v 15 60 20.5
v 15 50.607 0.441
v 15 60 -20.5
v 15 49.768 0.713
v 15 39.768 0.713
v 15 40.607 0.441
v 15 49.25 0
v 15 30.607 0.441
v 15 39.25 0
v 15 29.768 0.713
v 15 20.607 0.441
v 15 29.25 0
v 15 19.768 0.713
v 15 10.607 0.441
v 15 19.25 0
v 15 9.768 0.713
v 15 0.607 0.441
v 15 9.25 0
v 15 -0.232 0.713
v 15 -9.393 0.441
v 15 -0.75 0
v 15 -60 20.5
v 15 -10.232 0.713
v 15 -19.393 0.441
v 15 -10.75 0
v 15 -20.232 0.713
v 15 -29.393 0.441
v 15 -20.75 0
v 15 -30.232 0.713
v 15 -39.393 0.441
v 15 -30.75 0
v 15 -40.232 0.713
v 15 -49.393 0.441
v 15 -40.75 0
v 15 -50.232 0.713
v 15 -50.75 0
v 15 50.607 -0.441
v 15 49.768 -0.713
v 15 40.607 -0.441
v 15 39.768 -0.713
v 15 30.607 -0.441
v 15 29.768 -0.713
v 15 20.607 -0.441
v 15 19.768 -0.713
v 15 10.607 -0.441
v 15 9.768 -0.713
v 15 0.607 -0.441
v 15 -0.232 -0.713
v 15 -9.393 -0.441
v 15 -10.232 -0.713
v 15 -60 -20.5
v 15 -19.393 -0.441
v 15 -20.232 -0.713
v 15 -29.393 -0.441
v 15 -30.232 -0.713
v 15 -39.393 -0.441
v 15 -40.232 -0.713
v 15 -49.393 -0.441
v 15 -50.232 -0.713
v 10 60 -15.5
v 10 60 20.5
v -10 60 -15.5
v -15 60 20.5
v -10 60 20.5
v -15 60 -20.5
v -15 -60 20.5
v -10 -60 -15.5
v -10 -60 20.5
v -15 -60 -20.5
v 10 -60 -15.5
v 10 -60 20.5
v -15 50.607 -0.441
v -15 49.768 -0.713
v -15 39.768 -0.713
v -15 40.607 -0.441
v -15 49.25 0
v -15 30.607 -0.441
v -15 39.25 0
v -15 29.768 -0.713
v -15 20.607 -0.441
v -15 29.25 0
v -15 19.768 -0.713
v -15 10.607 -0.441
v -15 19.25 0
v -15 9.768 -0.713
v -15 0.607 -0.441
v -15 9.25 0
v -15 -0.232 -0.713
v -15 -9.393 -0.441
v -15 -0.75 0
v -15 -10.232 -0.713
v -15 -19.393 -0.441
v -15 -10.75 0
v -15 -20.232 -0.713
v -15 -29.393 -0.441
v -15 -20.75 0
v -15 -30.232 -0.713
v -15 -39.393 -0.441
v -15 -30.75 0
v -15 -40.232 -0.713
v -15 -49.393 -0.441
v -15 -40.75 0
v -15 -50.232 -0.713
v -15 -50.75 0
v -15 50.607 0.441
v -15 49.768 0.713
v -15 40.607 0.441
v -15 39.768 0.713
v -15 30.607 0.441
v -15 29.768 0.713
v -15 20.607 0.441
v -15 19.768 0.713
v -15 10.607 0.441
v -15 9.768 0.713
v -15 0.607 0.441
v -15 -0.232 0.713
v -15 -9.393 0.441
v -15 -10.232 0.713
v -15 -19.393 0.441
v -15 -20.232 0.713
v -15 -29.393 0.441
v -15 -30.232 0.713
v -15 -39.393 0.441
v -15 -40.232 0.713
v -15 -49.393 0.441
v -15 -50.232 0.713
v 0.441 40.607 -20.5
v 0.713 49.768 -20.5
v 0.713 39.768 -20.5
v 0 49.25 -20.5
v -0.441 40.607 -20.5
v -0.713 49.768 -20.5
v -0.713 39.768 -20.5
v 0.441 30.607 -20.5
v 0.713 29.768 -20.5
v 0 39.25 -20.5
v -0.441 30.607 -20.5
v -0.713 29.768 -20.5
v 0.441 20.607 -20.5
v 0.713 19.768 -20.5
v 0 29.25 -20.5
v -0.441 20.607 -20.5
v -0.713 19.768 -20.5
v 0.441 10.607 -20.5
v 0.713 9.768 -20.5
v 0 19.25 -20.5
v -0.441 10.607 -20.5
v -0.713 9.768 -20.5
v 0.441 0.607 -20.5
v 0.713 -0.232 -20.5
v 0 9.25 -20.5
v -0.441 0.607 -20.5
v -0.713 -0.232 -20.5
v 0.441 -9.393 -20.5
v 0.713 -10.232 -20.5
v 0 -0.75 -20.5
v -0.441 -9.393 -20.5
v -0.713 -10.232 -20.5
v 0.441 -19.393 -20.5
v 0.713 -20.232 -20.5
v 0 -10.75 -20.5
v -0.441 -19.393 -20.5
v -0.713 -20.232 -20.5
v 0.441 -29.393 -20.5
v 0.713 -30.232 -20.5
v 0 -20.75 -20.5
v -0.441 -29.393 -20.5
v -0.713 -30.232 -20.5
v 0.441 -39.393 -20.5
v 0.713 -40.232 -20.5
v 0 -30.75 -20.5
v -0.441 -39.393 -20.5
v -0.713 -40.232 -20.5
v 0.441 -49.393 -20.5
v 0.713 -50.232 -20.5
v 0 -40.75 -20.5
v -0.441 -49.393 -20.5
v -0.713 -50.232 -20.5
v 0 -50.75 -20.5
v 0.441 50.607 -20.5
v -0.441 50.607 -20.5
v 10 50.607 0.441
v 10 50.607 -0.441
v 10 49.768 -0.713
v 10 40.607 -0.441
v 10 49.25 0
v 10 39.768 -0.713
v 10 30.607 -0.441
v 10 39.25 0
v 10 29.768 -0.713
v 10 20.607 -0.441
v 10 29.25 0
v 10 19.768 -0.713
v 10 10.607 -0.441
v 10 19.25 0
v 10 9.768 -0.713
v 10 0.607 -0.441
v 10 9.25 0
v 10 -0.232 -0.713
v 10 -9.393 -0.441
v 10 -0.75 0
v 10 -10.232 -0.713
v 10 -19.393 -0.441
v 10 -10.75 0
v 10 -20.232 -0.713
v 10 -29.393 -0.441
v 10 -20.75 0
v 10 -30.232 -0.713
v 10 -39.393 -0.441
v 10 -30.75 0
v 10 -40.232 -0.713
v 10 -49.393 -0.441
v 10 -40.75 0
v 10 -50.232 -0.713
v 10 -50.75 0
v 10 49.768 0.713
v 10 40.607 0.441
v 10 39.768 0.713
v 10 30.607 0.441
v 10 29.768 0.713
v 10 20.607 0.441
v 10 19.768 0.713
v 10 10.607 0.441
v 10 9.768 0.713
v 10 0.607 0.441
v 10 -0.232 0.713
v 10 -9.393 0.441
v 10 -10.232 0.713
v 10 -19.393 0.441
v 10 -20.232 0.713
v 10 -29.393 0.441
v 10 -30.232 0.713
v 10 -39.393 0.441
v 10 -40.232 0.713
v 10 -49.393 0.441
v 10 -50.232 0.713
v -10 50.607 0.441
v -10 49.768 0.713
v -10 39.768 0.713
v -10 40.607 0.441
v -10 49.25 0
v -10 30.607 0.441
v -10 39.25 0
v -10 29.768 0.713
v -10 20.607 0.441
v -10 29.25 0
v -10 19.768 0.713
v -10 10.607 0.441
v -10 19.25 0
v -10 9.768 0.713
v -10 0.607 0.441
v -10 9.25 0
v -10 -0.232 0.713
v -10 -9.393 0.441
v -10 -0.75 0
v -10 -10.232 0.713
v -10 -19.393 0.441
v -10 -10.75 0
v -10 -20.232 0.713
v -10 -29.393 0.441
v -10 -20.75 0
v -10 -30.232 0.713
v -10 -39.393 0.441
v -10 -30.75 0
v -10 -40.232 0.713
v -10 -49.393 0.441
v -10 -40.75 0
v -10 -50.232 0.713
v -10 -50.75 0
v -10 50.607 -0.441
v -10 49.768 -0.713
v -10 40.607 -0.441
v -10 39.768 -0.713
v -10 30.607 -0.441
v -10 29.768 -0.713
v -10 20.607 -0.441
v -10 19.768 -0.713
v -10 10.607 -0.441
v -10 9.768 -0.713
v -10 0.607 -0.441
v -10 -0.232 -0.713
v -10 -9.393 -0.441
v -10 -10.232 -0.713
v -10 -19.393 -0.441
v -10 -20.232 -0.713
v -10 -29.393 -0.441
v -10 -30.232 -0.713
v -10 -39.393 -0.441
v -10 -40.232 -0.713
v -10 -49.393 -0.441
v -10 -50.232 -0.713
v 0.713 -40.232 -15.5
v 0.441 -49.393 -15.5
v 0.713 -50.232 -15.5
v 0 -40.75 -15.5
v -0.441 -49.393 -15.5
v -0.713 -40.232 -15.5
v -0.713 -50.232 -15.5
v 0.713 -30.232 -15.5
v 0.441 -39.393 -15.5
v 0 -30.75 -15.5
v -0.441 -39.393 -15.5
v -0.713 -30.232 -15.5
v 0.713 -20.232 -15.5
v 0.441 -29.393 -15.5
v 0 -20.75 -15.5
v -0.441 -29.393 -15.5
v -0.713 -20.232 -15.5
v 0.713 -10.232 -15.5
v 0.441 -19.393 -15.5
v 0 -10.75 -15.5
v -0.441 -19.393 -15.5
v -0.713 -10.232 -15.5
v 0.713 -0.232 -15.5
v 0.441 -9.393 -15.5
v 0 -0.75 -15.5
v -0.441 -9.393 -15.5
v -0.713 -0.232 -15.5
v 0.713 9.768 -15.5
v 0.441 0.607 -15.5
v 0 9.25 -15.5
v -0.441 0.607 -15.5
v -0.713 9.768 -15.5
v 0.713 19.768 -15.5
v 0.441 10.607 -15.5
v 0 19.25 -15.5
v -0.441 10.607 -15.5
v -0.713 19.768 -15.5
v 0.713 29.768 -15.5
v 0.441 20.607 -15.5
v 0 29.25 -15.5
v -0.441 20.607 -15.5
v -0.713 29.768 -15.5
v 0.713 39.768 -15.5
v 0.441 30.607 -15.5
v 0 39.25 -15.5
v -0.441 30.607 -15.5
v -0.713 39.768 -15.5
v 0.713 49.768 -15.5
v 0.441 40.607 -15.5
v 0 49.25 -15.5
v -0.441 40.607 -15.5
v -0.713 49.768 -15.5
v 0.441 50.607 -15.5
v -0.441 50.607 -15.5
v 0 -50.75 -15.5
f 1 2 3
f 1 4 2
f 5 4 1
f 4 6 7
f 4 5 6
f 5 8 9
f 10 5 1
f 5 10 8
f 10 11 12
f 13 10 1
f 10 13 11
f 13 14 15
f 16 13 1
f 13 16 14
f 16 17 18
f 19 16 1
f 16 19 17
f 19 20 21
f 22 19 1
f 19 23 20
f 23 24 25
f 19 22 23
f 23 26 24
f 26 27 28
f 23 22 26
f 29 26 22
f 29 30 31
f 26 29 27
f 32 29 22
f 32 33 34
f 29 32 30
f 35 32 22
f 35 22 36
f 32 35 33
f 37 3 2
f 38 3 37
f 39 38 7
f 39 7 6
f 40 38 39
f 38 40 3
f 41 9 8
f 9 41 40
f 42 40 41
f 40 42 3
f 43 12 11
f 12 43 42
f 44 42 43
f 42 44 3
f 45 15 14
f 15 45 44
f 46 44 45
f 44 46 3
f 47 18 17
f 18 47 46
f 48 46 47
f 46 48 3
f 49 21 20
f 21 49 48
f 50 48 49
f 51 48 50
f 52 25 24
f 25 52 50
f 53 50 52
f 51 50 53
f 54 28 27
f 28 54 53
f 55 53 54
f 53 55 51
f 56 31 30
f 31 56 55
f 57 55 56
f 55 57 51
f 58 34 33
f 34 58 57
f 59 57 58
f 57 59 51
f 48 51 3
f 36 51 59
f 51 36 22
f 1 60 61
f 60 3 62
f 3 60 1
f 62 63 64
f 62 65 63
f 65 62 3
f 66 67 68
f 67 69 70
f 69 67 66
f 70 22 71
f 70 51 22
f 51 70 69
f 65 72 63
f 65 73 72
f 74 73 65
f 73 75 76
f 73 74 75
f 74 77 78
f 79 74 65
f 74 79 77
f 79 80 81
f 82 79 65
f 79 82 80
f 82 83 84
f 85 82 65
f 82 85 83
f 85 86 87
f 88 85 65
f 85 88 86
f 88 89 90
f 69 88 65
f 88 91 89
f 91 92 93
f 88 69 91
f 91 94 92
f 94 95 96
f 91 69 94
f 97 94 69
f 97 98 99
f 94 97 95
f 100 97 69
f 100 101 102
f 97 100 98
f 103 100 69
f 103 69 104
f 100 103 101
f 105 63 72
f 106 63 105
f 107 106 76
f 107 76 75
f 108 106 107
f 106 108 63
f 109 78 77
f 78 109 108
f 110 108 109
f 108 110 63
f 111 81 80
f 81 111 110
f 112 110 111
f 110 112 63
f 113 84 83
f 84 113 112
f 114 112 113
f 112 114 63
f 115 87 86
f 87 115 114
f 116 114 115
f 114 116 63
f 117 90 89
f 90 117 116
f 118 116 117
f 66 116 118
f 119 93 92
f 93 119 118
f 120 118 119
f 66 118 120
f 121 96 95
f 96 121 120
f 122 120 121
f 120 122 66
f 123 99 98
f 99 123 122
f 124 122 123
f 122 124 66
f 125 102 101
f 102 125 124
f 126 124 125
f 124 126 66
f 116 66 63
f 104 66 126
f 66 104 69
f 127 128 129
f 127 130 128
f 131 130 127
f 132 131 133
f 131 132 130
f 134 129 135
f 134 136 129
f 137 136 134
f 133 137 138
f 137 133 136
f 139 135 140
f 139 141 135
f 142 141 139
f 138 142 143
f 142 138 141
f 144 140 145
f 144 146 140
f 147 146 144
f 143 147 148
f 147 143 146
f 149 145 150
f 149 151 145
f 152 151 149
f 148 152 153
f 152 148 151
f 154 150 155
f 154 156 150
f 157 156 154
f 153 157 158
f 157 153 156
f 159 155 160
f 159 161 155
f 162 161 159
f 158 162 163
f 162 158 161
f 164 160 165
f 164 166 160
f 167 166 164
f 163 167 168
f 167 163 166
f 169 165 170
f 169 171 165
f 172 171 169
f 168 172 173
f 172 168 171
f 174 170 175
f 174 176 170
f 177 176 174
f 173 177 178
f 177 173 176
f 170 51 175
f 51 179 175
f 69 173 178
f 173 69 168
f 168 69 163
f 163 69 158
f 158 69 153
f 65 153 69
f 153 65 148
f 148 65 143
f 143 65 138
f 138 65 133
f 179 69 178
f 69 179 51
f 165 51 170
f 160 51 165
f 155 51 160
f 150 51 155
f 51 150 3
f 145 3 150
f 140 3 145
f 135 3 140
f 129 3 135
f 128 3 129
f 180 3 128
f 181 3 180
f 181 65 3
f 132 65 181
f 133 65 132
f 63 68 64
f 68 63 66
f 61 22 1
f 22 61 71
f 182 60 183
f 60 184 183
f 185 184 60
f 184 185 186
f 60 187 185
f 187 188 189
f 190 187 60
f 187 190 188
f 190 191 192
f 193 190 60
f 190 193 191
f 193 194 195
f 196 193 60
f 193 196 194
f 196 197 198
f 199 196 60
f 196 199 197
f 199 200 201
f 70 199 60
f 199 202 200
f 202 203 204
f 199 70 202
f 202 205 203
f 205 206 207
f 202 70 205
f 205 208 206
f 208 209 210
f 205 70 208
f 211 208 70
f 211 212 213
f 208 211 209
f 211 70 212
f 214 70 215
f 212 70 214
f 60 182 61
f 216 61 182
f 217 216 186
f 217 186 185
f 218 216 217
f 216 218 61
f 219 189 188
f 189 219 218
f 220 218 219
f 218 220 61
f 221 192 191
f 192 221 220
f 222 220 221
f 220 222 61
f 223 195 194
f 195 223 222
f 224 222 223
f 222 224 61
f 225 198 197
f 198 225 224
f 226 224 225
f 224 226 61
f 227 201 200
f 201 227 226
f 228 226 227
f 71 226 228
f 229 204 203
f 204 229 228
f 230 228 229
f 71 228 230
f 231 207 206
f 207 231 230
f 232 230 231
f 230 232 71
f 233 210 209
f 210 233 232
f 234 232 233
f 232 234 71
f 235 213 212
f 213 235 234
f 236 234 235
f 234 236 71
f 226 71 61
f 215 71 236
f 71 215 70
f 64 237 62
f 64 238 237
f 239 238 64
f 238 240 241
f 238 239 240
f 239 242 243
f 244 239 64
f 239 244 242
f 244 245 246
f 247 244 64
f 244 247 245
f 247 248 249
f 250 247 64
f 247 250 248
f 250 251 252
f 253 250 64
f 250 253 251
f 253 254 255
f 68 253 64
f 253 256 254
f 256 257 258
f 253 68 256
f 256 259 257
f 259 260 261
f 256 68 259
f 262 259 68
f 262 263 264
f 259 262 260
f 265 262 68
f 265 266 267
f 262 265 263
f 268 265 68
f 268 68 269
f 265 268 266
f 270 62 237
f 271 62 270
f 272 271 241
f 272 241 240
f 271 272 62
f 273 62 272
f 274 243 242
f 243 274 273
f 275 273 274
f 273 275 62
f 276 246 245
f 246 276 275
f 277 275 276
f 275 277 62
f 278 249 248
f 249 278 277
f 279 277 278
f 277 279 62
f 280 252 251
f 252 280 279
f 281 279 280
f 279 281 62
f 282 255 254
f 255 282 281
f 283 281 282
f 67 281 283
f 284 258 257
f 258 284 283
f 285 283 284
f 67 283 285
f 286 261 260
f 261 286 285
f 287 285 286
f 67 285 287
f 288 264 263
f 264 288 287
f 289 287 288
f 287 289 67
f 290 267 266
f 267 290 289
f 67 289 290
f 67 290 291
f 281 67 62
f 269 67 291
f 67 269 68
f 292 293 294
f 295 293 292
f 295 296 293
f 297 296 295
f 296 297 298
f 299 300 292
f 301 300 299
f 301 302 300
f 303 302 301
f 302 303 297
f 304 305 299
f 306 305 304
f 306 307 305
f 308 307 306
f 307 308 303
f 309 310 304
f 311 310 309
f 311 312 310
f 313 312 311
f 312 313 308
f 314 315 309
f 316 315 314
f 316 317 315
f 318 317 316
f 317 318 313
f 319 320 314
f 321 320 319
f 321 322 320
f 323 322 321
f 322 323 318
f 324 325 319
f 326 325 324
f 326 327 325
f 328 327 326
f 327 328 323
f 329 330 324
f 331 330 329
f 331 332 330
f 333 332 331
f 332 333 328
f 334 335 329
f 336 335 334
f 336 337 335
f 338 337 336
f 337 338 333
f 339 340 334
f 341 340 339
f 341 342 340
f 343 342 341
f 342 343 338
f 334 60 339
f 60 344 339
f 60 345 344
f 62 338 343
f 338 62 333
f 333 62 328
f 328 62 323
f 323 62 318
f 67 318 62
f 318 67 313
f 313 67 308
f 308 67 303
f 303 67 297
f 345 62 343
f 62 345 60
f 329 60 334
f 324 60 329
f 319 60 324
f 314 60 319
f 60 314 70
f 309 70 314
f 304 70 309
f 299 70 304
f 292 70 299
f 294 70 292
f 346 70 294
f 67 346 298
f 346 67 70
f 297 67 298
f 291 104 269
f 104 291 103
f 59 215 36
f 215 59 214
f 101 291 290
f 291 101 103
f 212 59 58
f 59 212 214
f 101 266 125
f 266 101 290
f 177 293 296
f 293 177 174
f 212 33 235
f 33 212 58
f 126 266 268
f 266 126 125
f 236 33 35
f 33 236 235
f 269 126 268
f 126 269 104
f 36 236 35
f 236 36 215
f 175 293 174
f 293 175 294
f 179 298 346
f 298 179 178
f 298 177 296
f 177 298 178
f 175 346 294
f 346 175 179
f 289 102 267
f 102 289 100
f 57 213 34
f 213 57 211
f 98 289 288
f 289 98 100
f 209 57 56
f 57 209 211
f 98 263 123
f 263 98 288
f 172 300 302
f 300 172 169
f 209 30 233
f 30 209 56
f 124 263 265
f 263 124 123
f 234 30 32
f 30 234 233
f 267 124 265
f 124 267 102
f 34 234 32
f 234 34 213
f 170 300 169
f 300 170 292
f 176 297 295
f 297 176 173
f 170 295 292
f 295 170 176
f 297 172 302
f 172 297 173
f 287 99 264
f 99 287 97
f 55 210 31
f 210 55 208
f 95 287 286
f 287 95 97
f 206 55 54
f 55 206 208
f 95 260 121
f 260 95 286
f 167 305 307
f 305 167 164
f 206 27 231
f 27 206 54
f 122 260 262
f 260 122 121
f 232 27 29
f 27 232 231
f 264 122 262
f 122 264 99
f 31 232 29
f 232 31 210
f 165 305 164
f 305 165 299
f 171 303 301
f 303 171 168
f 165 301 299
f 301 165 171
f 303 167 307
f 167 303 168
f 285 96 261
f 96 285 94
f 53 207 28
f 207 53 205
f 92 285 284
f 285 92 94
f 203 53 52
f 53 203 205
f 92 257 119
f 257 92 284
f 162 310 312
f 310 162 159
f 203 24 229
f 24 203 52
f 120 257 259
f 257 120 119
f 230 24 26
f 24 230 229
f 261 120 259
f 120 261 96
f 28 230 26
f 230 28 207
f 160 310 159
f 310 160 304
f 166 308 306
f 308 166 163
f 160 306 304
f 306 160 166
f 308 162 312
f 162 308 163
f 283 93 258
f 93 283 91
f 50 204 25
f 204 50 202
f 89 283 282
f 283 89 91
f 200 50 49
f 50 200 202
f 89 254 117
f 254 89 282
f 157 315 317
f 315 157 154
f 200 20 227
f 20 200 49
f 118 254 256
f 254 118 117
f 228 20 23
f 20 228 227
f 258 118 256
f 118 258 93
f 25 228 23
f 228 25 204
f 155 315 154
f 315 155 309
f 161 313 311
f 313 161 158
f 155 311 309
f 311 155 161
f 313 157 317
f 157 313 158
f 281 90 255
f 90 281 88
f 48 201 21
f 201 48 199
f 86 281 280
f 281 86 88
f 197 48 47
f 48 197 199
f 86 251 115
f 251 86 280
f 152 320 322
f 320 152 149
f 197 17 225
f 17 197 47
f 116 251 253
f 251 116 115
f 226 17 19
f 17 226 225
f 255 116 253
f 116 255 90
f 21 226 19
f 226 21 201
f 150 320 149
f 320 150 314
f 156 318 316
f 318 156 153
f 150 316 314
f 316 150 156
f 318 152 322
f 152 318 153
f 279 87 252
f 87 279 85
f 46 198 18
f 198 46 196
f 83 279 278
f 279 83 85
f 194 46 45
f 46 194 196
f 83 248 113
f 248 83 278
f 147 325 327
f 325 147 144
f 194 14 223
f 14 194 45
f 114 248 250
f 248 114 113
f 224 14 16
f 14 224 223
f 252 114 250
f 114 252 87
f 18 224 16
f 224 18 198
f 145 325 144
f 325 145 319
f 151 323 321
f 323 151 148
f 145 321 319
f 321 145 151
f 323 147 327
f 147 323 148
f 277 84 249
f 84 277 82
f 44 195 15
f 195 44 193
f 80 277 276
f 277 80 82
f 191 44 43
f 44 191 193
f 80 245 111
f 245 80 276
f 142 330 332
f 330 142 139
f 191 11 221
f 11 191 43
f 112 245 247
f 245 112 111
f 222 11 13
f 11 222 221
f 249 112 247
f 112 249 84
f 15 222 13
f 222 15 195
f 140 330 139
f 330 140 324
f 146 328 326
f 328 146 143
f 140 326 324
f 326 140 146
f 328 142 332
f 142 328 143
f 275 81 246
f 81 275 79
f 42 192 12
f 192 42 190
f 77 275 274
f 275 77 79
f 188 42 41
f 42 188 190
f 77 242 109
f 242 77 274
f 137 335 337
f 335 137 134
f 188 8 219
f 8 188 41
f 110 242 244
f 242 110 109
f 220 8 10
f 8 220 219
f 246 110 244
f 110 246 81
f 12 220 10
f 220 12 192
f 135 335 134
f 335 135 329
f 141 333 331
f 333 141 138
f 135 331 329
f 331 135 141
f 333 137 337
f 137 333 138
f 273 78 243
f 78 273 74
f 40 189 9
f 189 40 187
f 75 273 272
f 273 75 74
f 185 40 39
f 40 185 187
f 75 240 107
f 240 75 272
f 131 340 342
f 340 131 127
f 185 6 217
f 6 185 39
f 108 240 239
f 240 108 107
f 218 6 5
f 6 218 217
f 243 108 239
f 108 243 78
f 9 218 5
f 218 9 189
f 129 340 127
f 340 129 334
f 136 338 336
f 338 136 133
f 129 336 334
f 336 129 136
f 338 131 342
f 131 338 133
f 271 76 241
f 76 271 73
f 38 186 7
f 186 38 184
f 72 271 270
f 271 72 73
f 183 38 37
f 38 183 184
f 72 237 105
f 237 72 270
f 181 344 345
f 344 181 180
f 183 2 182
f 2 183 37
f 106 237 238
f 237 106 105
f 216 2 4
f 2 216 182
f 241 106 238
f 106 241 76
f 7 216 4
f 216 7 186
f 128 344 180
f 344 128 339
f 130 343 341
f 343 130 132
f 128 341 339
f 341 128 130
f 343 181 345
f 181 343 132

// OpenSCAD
rotate([90+180,0,0])
difference(){
difference(){
  cube([20+10,36+5,120],center=true);
  translate([0,-5/2,0])cube([20,36,120],center=true);

}
union(){
  for(i = [-50:10:50],rot=[0,90])
  {
    rotate([0,0,rot])#translate([-30,0,i])rotate([0,90,0])cylinder(d=1.5,h=100);

  }

}
}
